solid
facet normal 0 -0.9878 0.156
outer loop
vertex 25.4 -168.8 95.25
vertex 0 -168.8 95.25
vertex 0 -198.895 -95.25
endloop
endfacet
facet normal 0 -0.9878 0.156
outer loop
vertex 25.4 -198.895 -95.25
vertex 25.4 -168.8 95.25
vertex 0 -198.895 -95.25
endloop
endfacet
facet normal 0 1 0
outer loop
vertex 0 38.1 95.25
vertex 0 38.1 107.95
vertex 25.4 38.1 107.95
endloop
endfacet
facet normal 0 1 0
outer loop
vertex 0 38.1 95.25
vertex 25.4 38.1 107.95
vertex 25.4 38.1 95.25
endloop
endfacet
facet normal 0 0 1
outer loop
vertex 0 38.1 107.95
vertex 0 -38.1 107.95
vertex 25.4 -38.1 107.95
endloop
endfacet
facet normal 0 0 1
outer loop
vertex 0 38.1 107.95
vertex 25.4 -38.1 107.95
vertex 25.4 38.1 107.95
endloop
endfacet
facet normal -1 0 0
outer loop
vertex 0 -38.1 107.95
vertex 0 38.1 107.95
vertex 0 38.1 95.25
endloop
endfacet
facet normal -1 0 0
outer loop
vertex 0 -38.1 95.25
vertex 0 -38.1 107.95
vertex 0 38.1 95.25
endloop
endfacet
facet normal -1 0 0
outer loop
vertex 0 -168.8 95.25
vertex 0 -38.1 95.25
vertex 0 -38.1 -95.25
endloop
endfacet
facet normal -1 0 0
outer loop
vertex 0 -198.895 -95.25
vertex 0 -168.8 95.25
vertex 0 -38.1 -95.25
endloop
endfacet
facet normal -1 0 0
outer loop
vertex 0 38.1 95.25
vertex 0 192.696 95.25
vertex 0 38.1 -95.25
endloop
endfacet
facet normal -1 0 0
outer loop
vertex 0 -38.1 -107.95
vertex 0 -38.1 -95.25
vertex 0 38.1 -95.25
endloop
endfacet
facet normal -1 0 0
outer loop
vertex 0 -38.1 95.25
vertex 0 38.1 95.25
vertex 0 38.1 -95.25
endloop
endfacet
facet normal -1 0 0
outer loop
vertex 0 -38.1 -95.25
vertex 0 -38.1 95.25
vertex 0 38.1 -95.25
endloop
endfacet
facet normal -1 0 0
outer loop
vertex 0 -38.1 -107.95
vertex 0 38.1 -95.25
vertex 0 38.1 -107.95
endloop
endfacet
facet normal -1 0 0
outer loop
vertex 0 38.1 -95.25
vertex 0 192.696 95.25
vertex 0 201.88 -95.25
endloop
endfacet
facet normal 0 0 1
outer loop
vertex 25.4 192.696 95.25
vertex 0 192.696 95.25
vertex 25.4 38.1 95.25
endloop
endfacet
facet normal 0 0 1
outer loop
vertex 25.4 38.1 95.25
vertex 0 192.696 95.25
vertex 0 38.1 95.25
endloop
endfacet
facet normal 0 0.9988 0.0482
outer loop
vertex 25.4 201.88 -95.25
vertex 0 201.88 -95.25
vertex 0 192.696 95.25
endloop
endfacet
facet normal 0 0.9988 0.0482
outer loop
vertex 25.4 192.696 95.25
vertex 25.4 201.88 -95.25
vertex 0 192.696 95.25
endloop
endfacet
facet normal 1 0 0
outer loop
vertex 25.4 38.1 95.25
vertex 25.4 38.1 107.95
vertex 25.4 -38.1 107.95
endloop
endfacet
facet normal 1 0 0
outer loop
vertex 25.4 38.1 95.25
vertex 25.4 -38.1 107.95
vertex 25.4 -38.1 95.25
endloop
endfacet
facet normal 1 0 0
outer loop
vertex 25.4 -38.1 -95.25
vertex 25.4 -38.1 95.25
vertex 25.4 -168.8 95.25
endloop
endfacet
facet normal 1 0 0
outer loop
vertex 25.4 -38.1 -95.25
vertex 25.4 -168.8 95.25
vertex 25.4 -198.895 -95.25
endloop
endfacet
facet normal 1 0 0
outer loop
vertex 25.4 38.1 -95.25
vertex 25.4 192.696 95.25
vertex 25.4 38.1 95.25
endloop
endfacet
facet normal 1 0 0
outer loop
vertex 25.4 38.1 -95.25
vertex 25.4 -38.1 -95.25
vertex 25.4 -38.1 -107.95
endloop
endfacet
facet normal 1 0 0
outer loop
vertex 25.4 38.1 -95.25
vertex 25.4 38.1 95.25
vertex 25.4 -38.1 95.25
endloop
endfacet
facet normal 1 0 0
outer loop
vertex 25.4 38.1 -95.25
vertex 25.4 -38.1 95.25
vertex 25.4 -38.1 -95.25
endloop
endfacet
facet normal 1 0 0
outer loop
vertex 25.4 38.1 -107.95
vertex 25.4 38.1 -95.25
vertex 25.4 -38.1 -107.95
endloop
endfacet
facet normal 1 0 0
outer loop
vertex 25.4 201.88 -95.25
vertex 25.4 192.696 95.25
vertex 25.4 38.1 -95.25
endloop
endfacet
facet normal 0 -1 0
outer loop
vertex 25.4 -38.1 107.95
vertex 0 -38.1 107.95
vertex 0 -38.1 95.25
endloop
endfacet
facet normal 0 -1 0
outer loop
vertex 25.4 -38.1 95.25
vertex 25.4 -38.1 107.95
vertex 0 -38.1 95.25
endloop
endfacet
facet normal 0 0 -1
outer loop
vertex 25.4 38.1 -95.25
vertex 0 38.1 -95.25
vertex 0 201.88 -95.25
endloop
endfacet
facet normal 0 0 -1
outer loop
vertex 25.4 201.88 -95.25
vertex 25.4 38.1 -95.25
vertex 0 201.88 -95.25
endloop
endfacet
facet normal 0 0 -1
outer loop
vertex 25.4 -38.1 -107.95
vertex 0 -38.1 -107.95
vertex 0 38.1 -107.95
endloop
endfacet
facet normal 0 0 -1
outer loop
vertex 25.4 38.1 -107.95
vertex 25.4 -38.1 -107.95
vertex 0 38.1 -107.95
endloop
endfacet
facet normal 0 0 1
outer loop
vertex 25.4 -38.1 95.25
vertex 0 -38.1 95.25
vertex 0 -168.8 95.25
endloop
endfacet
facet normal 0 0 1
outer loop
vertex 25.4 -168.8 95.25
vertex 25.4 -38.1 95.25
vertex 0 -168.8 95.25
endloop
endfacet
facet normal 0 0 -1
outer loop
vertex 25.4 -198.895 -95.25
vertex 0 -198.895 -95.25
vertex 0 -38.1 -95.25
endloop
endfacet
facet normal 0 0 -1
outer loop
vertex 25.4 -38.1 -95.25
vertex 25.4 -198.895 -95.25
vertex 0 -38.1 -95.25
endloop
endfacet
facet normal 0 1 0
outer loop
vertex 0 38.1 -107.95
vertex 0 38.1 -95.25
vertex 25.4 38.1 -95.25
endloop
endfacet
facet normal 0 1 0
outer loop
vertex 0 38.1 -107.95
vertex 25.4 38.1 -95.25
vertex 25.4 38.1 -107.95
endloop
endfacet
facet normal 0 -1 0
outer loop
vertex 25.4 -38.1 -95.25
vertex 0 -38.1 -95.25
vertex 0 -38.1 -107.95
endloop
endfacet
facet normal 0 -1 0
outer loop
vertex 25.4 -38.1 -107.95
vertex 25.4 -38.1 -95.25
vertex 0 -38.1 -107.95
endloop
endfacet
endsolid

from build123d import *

# Parameters (mm, degrees)
SKETCH1_W           = 12.7
SKETCH1_H           = 76.2
SKETCH1_W_2         = 190.5
BOSS_EXTRUDE1_DEPTH = 25.4


with BuildPart() as part:
    # Sketch1 → Boss-Extrude1 (new body)
    with BuildSketch(Plane(origin=(0, 0, 0), x_dir=(0, 0, -1), z_dir=(1, 0, 0))):
        Polygon((95.25, 201.879837032), (-95.25, 192.69579571), (-95.25, 38.1), (95.25, 38.1), align=None)
        with Locations((101.6, 0)):
            Rectangle(SKETCH1_W, SKETCH1_H)
        Rectangle(SKETCH1_W_2, SKETCH1_H)
        with Locations((-101.6, 0)):
            Rectangle(SKETCH1_W, SKETCH1_H)
        Polygon((95.25, -38.1), (-95.25, -38.1), (-95.25, -168.80022374), (95.25, -198.895286486), align=None)
    extrude(amount=BOSS_EXTRUDE1_DEPTH)


solid = part.part
